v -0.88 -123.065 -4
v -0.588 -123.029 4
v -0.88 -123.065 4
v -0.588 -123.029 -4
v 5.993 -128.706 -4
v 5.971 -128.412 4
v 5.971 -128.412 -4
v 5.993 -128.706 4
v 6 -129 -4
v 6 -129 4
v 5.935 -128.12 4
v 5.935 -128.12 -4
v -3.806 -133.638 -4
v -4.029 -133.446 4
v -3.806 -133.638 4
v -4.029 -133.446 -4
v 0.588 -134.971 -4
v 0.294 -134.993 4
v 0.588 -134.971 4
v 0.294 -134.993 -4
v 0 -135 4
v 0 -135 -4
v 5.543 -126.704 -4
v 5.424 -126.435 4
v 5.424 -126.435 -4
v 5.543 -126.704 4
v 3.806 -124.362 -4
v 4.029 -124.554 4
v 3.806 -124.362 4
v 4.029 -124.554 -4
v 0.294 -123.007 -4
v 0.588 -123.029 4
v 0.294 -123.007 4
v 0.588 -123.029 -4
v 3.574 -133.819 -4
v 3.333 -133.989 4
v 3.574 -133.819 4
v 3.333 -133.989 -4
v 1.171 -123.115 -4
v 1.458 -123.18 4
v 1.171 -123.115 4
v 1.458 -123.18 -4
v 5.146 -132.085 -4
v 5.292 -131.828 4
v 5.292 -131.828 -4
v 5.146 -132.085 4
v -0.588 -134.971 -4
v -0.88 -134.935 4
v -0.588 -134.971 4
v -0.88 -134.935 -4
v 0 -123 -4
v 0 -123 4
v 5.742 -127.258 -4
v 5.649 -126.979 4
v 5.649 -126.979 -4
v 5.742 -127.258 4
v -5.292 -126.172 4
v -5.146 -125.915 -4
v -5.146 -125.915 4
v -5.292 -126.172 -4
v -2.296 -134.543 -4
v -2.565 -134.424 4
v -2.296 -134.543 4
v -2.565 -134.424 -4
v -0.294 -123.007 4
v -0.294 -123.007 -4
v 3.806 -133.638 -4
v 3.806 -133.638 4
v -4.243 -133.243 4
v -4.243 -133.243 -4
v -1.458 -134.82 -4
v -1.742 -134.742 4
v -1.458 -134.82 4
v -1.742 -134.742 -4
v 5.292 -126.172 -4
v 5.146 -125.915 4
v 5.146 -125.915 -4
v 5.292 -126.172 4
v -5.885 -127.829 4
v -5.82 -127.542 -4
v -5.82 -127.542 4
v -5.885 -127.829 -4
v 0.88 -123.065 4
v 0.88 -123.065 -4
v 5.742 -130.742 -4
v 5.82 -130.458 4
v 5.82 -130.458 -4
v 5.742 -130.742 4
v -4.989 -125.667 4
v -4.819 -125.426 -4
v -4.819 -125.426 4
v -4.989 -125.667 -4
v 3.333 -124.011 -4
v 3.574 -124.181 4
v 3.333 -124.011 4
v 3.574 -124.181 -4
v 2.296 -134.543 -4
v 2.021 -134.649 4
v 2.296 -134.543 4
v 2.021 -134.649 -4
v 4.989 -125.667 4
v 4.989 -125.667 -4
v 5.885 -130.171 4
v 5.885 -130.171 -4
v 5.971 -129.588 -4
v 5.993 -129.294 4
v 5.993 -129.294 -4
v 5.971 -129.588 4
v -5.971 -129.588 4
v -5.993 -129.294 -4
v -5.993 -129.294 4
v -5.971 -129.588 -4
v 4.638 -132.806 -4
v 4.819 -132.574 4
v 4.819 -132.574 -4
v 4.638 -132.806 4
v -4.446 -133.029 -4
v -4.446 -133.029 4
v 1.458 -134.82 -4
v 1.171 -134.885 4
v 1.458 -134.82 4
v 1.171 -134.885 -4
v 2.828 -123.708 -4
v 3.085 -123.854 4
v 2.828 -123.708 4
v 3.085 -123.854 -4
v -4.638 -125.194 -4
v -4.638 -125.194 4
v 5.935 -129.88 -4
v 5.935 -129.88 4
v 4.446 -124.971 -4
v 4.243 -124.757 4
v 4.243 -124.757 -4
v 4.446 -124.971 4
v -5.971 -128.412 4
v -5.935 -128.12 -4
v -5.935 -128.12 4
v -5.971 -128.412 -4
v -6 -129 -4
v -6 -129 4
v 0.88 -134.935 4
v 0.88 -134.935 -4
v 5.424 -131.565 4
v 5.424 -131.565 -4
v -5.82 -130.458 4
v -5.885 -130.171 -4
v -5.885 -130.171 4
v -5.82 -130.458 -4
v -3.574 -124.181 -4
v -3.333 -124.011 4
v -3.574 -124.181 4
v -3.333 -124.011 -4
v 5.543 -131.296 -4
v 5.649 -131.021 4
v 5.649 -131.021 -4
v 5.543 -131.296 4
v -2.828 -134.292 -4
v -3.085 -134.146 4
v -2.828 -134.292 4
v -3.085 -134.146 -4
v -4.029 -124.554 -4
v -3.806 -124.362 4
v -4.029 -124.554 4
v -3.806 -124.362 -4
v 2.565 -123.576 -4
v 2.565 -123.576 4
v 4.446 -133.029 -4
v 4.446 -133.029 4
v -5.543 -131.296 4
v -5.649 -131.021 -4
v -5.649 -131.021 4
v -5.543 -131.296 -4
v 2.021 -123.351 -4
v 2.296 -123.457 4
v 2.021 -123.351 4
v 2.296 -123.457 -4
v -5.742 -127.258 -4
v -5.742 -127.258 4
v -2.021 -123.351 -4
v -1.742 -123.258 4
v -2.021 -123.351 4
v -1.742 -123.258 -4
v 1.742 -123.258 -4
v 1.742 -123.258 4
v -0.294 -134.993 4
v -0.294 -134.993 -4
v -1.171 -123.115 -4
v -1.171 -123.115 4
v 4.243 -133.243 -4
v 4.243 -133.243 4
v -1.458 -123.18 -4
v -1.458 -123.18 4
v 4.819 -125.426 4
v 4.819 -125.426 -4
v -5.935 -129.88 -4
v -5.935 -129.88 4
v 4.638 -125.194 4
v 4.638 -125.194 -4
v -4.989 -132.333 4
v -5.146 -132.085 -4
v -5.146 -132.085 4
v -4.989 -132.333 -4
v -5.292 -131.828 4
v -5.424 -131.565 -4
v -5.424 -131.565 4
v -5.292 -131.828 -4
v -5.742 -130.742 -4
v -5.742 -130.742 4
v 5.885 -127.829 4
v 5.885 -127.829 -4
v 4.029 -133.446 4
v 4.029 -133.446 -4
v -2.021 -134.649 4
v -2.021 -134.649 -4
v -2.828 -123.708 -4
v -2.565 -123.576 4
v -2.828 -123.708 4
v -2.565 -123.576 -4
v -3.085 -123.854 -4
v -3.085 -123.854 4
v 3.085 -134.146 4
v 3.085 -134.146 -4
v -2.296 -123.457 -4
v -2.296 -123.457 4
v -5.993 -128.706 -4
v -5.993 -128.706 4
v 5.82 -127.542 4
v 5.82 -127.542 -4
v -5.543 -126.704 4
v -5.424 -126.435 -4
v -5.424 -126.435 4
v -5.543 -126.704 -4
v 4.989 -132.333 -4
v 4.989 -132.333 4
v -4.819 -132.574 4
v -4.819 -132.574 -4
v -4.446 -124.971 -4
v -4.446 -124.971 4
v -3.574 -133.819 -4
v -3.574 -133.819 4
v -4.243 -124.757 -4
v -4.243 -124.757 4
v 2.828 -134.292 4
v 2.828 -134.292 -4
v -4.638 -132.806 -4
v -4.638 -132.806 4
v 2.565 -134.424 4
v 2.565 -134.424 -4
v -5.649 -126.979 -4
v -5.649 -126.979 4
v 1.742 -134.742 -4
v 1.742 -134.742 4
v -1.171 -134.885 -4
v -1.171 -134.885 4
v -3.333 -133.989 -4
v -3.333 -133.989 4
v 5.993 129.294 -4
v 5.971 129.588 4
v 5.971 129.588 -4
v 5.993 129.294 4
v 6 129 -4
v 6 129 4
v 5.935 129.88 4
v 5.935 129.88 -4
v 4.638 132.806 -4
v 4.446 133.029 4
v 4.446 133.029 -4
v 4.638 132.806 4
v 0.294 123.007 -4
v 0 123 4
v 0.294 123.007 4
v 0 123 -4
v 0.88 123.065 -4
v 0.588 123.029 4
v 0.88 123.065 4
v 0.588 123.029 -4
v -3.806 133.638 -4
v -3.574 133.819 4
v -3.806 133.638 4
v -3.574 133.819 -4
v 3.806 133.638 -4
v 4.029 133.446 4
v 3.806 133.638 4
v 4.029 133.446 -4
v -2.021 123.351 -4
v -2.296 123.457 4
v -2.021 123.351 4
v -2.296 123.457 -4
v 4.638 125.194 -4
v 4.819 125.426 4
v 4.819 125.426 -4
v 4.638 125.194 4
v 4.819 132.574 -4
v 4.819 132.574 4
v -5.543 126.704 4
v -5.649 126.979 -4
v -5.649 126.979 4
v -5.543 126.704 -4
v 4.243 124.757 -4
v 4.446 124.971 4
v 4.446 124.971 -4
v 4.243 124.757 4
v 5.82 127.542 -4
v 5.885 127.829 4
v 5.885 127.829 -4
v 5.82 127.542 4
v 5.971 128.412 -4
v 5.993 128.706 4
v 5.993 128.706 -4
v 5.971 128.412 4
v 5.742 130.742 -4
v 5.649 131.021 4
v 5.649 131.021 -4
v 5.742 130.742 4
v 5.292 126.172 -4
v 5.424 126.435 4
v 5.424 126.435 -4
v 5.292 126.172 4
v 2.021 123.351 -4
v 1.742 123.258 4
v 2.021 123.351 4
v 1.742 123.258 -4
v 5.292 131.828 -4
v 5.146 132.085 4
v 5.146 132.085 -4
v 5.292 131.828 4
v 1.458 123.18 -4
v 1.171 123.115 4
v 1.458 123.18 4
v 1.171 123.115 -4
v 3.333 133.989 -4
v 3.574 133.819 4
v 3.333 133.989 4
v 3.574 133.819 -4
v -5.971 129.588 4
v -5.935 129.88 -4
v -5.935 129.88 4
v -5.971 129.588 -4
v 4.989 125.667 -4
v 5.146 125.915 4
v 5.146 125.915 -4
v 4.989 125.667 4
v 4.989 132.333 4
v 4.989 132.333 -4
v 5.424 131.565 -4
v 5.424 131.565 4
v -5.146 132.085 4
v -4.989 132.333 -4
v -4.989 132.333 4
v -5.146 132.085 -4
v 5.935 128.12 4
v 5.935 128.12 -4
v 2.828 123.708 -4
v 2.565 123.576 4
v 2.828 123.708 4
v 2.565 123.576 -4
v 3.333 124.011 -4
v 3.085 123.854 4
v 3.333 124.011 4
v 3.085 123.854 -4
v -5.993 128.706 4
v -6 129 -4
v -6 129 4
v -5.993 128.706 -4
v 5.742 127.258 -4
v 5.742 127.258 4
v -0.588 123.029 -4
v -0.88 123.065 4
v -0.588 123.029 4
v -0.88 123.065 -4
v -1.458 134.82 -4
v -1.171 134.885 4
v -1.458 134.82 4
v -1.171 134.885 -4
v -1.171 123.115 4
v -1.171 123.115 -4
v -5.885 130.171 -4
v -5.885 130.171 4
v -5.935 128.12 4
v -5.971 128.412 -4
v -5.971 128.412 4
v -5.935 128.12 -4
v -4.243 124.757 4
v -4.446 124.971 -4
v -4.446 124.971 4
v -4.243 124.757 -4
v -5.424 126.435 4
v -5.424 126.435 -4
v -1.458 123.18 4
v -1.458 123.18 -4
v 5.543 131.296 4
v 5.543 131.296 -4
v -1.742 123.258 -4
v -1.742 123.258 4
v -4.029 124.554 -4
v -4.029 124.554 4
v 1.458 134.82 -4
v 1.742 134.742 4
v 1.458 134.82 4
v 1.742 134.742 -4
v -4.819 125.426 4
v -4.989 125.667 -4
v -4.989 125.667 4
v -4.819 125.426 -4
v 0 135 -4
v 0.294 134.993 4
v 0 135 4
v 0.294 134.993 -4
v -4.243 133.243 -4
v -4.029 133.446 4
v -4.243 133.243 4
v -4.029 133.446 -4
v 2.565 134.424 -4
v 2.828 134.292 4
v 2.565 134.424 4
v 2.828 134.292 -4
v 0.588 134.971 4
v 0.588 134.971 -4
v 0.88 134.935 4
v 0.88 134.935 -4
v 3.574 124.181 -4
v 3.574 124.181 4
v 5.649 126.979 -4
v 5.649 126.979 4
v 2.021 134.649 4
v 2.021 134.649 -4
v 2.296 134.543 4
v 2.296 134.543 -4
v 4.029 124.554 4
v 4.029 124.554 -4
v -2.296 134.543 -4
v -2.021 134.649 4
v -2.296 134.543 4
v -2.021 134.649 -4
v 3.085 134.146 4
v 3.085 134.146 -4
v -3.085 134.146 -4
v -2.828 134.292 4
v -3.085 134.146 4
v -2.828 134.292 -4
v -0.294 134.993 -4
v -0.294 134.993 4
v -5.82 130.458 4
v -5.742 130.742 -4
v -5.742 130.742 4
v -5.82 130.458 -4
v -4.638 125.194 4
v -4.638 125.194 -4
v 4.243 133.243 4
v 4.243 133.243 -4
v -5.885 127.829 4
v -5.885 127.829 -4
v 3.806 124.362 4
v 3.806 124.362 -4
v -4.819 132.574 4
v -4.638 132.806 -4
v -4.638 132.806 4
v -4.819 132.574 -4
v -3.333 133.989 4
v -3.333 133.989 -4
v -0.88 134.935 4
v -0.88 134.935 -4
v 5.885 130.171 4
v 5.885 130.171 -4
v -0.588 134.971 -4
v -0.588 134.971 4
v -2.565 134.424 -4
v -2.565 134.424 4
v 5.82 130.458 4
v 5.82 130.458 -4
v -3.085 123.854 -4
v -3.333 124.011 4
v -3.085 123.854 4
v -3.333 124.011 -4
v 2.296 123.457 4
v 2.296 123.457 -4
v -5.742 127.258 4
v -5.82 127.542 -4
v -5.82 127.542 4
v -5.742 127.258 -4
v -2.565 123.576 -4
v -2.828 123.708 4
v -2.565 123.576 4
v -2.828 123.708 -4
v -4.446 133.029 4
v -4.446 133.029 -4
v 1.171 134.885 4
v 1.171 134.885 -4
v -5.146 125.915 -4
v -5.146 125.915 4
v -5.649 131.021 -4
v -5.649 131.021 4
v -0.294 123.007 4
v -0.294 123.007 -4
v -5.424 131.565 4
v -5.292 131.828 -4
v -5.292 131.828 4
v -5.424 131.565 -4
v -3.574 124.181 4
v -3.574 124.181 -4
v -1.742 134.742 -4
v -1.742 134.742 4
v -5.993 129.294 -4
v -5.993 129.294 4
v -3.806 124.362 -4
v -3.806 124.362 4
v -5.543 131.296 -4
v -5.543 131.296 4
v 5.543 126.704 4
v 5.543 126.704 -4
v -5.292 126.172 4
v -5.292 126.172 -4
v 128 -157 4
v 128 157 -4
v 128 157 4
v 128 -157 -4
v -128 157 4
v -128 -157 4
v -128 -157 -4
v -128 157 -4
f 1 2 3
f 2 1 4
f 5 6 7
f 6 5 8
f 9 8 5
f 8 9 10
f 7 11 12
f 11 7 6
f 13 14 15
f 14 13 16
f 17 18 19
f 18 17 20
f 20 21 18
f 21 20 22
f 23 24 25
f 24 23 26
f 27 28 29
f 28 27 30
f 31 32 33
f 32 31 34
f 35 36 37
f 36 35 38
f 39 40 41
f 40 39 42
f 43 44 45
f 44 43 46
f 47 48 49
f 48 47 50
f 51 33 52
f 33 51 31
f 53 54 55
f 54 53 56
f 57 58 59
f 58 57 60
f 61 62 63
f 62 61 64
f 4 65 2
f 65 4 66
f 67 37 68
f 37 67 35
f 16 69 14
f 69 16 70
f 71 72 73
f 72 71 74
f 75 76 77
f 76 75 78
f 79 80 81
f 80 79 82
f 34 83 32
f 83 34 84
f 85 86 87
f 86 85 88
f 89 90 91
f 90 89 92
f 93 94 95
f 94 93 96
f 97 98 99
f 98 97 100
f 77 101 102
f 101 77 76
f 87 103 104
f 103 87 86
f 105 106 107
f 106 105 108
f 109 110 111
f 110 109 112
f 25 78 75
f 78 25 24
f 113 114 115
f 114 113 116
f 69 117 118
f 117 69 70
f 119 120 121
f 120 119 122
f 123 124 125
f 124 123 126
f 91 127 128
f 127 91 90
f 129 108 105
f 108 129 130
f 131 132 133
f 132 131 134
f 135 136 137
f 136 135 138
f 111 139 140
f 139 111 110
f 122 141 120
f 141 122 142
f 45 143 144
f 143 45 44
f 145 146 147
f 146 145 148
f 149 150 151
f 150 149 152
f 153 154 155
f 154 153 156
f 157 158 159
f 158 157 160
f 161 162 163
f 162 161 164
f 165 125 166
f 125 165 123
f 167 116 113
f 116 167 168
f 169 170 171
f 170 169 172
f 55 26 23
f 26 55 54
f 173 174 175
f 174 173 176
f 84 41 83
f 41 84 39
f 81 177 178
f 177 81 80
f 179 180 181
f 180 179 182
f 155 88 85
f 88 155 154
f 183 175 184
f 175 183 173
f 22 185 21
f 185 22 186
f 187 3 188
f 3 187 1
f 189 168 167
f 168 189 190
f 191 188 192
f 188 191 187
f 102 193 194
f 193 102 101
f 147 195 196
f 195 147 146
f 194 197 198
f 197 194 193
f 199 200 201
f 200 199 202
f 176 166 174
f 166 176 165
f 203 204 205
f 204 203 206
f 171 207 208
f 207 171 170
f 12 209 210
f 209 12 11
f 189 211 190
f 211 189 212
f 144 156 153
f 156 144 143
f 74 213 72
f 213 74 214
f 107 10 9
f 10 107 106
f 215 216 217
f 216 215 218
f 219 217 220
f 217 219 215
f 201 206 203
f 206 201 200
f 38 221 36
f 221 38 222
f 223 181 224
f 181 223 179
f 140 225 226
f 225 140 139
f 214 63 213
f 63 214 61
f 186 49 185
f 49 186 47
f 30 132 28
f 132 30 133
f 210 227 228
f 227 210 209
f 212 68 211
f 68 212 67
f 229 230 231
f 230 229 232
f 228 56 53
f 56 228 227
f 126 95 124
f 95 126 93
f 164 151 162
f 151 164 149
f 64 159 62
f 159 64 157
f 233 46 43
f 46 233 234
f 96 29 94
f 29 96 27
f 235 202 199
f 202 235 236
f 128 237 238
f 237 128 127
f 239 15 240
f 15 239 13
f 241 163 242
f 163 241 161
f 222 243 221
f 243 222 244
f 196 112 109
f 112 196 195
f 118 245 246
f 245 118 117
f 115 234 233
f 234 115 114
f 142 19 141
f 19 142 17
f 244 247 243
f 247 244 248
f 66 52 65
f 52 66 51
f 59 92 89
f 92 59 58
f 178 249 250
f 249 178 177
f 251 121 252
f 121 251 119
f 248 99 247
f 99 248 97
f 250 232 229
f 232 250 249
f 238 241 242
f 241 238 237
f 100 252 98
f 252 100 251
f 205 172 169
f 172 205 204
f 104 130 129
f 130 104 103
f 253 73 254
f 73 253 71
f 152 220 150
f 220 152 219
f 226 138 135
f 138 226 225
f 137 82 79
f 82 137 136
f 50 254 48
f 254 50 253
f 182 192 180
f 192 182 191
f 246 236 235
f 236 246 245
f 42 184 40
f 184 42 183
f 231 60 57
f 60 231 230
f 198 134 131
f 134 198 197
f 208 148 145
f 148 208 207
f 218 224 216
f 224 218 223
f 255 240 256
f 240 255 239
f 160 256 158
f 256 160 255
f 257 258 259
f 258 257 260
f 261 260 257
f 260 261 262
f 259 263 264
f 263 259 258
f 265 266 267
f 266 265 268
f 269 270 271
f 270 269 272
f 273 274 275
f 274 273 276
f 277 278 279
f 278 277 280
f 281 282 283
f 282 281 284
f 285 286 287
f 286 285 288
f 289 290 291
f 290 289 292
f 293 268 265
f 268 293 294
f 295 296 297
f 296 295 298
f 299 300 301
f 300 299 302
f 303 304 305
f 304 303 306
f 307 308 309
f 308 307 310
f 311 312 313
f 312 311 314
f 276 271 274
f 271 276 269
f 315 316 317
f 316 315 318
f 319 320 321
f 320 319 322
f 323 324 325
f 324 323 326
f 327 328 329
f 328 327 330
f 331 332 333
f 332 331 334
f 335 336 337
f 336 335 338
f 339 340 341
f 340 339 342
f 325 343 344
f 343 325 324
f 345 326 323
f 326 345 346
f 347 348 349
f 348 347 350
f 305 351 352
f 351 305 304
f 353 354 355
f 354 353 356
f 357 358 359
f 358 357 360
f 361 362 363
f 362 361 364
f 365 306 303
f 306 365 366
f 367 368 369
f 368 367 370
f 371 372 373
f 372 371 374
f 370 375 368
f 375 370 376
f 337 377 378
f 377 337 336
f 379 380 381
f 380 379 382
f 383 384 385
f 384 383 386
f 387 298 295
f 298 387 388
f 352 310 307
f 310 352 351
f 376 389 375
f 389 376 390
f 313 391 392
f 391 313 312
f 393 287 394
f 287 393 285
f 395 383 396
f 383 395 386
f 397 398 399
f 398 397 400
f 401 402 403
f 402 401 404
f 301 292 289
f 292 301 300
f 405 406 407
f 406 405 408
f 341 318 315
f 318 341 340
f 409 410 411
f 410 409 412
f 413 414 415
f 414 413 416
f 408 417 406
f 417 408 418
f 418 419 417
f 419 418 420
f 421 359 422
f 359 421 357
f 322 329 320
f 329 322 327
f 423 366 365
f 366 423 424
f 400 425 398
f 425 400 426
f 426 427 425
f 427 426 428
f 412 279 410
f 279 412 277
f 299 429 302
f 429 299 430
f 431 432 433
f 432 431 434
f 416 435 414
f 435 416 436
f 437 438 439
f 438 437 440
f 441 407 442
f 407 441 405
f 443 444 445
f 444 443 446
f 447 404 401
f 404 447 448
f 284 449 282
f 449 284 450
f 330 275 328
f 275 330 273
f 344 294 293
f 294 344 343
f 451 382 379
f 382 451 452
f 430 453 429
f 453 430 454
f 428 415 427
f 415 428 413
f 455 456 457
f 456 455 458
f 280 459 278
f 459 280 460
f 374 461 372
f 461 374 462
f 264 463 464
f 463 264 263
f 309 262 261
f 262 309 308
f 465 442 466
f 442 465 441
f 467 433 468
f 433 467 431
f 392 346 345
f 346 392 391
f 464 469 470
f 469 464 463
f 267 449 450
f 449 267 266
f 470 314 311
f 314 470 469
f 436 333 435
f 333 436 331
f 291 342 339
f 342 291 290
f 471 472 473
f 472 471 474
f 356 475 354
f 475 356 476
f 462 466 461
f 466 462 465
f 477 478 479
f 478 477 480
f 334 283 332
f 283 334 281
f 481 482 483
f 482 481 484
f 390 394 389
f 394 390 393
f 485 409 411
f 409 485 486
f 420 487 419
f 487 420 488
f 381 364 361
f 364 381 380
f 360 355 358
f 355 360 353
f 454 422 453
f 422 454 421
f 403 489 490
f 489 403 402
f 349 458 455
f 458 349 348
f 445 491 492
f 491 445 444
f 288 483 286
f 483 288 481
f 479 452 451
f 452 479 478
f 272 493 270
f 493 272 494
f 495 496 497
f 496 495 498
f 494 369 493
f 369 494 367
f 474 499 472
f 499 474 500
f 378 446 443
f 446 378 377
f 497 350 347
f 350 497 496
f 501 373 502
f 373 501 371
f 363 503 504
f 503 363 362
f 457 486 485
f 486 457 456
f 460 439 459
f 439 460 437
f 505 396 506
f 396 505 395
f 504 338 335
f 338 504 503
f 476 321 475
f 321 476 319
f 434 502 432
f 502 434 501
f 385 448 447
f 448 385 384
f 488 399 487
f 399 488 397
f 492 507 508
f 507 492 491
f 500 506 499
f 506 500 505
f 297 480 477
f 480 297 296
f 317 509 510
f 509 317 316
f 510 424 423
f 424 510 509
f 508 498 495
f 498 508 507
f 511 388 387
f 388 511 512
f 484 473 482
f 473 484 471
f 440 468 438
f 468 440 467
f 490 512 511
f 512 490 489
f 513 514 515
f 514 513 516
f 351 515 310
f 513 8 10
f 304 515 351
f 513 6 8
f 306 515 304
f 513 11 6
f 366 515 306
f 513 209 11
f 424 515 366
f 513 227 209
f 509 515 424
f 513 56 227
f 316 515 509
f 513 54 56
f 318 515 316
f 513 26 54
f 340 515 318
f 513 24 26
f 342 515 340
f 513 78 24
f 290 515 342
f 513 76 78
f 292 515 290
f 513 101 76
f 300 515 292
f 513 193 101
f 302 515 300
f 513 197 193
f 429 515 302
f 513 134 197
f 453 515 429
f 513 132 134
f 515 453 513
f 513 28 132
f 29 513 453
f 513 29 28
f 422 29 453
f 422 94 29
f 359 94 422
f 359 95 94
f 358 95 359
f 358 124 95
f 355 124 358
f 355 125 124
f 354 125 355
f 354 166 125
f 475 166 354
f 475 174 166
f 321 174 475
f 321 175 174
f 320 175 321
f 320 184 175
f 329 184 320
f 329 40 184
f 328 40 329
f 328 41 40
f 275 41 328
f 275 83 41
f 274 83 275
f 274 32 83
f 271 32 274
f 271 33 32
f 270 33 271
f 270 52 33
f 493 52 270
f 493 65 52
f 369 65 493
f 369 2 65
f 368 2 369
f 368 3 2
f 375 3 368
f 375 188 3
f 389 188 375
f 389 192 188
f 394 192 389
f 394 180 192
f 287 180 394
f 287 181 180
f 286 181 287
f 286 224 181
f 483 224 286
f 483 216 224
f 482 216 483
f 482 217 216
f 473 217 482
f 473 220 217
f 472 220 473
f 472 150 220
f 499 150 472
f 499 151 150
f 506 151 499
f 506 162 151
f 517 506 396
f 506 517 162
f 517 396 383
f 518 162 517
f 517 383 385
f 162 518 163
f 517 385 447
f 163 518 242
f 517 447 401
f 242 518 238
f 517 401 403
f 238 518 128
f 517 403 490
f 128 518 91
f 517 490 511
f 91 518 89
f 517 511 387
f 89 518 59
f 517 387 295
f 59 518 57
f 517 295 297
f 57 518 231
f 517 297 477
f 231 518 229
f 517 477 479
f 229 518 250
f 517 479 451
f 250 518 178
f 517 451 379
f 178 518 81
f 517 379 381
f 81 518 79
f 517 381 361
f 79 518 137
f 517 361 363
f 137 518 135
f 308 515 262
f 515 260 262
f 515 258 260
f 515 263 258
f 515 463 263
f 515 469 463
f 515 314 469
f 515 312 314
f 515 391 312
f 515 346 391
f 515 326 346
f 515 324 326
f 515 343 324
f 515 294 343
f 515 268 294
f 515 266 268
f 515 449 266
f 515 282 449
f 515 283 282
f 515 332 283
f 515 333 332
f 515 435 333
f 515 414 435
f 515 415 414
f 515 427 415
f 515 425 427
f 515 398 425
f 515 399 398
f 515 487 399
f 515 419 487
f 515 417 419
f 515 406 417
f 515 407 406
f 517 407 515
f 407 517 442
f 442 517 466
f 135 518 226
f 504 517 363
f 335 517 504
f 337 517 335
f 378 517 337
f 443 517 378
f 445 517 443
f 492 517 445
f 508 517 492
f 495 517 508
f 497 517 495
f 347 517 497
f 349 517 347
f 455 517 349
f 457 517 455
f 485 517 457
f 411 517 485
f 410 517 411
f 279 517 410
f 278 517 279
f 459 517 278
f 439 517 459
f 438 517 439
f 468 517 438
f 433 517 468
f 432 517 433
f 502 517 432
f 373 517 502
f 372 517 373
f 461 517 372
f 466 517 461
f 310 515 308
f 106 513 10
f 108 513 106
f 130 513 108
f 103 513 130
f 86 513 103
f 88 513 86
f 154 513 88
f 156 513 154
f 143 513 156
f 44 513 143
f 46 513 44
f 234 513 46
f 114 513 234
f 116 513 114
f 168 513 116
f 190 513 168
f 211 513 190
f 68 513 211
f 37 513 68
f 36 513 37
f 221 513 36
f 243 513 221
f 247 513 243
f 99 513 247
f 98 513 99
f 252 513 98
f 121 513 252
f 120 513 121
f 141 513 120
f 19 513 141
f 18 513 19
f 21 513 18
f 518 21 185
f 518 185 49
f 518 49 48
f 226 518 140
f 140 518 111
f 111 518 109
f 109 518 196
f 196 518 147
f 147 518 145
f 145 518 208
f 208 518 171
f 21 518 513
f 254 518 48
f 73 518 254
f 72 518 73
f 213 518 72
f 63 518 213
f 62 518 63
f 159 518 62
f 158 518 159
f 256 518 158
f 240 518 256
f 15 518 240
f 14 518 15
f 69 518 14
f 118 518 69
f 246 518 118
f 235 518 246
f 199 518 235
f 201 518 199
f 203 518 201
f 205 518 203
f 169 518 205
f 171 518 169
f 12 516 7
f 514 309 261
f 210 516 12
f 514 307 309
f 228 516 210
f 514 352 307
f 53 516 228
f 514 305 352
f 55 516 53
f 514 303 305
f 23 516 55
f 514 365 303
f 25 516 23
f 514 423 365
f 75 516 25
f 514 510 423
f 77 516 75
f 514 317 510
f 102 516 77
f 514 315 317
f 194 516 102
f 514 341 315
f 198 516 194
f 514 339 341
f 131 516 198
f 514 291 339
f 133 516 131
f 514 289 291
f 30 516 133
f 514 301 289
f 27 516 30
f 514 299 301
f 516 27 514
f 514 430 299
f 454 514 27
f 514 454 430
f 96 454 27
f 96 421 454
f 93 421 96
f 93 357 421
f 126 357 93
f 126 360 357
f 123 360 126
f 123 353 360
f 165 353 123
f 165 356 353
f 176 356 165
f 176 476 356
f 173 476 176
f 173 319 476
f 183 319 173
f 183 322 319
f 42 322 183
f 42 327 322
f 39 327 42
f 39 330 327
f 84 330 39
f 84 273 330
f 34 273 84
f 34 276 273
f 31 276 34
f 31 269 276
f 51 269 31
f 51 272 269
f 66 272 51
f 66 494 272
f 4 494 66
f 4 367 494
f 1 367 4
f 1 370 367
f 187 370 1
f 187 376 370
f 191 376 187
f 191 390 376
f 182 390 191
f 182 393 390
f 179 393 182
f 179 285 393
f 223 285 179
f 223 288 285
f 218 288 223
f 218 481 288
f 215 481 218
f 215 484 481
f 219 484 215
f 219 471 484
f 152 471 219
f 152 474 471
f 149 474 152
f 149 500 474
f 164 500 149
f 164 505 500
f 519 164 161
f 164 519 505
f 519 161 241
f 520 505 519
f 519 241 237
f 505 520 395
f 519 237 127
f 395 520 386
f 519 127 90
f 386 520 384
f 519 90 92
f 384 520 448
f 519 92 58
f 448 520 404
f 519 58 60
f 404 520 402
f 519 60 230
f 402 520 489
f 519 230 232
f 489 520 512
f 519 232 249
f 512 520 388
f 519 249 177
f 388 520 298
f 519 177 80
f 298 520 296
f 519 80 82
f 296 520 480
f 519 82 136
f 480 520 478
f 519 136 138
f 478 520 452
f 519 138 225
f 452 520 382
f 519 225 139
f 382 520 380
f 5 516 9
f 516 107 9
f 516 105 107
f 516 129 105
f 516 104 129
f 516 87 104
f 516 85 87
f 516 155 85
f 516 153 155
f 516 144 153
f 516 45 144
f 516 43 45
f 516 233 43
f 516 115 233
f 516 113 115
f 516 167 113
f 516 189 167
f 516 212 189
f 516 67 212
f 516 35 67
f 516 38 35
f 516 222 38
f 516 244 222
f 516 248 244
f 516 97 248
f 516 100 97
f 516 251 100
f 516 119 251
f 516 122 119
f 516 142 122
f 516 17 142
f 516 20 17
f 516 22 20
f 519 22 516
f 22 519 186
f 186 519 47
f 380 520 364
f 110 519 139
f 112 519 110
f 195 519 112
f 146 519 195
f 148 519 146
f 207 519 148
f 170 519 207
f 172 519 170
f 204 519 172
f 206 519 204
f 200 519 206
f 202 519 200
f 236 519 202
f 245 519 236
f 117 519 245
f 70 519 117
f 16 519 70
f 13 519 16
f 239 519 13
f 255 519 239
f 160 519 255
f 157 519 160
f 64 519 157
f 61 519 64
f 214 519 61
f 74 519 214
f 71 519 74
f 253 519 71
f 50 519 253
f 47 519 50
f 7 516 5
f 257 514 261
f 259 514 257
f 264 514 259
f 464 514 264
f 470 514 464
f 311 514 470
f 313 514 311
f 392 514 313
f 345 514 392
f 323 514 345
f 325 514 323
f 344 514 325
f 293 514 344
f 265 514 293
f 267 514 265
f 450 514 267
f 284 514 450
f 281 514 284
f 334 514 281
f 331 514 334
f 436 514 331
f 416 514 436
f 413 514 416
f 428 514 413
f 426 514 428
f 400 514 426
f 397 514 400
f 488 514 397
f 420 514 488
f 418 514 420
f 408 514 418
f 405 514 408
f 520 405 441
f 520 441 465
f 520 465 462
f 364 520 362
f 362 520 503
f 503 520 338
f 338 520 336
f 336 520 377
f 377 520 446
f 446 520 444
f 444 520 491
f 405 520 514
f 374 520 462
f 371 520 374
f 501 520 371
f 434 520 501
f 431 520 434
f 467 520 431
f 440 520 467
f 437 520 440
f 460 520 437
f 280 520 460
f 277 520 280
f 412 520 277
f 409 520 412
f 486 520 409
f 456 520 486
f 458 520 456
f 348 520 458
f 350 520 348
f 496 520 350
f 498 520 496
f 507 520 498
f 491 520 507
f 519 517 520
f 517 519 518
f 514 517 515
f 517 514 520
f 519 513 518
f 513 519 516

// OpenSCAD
// PROVISIONAL simulation mesh only; not manufacturing CAD.
// Accepted 256 x 314 x 8 mm upper panel with two 12 mm shaft/service openings.
$fn = 128;

difference() {
    cube([256, 314, 8], center=true);
    for (y = [-129, 129])
        translate([0, y, 0]) cylinder(d=12, h=10, center=true);
}
